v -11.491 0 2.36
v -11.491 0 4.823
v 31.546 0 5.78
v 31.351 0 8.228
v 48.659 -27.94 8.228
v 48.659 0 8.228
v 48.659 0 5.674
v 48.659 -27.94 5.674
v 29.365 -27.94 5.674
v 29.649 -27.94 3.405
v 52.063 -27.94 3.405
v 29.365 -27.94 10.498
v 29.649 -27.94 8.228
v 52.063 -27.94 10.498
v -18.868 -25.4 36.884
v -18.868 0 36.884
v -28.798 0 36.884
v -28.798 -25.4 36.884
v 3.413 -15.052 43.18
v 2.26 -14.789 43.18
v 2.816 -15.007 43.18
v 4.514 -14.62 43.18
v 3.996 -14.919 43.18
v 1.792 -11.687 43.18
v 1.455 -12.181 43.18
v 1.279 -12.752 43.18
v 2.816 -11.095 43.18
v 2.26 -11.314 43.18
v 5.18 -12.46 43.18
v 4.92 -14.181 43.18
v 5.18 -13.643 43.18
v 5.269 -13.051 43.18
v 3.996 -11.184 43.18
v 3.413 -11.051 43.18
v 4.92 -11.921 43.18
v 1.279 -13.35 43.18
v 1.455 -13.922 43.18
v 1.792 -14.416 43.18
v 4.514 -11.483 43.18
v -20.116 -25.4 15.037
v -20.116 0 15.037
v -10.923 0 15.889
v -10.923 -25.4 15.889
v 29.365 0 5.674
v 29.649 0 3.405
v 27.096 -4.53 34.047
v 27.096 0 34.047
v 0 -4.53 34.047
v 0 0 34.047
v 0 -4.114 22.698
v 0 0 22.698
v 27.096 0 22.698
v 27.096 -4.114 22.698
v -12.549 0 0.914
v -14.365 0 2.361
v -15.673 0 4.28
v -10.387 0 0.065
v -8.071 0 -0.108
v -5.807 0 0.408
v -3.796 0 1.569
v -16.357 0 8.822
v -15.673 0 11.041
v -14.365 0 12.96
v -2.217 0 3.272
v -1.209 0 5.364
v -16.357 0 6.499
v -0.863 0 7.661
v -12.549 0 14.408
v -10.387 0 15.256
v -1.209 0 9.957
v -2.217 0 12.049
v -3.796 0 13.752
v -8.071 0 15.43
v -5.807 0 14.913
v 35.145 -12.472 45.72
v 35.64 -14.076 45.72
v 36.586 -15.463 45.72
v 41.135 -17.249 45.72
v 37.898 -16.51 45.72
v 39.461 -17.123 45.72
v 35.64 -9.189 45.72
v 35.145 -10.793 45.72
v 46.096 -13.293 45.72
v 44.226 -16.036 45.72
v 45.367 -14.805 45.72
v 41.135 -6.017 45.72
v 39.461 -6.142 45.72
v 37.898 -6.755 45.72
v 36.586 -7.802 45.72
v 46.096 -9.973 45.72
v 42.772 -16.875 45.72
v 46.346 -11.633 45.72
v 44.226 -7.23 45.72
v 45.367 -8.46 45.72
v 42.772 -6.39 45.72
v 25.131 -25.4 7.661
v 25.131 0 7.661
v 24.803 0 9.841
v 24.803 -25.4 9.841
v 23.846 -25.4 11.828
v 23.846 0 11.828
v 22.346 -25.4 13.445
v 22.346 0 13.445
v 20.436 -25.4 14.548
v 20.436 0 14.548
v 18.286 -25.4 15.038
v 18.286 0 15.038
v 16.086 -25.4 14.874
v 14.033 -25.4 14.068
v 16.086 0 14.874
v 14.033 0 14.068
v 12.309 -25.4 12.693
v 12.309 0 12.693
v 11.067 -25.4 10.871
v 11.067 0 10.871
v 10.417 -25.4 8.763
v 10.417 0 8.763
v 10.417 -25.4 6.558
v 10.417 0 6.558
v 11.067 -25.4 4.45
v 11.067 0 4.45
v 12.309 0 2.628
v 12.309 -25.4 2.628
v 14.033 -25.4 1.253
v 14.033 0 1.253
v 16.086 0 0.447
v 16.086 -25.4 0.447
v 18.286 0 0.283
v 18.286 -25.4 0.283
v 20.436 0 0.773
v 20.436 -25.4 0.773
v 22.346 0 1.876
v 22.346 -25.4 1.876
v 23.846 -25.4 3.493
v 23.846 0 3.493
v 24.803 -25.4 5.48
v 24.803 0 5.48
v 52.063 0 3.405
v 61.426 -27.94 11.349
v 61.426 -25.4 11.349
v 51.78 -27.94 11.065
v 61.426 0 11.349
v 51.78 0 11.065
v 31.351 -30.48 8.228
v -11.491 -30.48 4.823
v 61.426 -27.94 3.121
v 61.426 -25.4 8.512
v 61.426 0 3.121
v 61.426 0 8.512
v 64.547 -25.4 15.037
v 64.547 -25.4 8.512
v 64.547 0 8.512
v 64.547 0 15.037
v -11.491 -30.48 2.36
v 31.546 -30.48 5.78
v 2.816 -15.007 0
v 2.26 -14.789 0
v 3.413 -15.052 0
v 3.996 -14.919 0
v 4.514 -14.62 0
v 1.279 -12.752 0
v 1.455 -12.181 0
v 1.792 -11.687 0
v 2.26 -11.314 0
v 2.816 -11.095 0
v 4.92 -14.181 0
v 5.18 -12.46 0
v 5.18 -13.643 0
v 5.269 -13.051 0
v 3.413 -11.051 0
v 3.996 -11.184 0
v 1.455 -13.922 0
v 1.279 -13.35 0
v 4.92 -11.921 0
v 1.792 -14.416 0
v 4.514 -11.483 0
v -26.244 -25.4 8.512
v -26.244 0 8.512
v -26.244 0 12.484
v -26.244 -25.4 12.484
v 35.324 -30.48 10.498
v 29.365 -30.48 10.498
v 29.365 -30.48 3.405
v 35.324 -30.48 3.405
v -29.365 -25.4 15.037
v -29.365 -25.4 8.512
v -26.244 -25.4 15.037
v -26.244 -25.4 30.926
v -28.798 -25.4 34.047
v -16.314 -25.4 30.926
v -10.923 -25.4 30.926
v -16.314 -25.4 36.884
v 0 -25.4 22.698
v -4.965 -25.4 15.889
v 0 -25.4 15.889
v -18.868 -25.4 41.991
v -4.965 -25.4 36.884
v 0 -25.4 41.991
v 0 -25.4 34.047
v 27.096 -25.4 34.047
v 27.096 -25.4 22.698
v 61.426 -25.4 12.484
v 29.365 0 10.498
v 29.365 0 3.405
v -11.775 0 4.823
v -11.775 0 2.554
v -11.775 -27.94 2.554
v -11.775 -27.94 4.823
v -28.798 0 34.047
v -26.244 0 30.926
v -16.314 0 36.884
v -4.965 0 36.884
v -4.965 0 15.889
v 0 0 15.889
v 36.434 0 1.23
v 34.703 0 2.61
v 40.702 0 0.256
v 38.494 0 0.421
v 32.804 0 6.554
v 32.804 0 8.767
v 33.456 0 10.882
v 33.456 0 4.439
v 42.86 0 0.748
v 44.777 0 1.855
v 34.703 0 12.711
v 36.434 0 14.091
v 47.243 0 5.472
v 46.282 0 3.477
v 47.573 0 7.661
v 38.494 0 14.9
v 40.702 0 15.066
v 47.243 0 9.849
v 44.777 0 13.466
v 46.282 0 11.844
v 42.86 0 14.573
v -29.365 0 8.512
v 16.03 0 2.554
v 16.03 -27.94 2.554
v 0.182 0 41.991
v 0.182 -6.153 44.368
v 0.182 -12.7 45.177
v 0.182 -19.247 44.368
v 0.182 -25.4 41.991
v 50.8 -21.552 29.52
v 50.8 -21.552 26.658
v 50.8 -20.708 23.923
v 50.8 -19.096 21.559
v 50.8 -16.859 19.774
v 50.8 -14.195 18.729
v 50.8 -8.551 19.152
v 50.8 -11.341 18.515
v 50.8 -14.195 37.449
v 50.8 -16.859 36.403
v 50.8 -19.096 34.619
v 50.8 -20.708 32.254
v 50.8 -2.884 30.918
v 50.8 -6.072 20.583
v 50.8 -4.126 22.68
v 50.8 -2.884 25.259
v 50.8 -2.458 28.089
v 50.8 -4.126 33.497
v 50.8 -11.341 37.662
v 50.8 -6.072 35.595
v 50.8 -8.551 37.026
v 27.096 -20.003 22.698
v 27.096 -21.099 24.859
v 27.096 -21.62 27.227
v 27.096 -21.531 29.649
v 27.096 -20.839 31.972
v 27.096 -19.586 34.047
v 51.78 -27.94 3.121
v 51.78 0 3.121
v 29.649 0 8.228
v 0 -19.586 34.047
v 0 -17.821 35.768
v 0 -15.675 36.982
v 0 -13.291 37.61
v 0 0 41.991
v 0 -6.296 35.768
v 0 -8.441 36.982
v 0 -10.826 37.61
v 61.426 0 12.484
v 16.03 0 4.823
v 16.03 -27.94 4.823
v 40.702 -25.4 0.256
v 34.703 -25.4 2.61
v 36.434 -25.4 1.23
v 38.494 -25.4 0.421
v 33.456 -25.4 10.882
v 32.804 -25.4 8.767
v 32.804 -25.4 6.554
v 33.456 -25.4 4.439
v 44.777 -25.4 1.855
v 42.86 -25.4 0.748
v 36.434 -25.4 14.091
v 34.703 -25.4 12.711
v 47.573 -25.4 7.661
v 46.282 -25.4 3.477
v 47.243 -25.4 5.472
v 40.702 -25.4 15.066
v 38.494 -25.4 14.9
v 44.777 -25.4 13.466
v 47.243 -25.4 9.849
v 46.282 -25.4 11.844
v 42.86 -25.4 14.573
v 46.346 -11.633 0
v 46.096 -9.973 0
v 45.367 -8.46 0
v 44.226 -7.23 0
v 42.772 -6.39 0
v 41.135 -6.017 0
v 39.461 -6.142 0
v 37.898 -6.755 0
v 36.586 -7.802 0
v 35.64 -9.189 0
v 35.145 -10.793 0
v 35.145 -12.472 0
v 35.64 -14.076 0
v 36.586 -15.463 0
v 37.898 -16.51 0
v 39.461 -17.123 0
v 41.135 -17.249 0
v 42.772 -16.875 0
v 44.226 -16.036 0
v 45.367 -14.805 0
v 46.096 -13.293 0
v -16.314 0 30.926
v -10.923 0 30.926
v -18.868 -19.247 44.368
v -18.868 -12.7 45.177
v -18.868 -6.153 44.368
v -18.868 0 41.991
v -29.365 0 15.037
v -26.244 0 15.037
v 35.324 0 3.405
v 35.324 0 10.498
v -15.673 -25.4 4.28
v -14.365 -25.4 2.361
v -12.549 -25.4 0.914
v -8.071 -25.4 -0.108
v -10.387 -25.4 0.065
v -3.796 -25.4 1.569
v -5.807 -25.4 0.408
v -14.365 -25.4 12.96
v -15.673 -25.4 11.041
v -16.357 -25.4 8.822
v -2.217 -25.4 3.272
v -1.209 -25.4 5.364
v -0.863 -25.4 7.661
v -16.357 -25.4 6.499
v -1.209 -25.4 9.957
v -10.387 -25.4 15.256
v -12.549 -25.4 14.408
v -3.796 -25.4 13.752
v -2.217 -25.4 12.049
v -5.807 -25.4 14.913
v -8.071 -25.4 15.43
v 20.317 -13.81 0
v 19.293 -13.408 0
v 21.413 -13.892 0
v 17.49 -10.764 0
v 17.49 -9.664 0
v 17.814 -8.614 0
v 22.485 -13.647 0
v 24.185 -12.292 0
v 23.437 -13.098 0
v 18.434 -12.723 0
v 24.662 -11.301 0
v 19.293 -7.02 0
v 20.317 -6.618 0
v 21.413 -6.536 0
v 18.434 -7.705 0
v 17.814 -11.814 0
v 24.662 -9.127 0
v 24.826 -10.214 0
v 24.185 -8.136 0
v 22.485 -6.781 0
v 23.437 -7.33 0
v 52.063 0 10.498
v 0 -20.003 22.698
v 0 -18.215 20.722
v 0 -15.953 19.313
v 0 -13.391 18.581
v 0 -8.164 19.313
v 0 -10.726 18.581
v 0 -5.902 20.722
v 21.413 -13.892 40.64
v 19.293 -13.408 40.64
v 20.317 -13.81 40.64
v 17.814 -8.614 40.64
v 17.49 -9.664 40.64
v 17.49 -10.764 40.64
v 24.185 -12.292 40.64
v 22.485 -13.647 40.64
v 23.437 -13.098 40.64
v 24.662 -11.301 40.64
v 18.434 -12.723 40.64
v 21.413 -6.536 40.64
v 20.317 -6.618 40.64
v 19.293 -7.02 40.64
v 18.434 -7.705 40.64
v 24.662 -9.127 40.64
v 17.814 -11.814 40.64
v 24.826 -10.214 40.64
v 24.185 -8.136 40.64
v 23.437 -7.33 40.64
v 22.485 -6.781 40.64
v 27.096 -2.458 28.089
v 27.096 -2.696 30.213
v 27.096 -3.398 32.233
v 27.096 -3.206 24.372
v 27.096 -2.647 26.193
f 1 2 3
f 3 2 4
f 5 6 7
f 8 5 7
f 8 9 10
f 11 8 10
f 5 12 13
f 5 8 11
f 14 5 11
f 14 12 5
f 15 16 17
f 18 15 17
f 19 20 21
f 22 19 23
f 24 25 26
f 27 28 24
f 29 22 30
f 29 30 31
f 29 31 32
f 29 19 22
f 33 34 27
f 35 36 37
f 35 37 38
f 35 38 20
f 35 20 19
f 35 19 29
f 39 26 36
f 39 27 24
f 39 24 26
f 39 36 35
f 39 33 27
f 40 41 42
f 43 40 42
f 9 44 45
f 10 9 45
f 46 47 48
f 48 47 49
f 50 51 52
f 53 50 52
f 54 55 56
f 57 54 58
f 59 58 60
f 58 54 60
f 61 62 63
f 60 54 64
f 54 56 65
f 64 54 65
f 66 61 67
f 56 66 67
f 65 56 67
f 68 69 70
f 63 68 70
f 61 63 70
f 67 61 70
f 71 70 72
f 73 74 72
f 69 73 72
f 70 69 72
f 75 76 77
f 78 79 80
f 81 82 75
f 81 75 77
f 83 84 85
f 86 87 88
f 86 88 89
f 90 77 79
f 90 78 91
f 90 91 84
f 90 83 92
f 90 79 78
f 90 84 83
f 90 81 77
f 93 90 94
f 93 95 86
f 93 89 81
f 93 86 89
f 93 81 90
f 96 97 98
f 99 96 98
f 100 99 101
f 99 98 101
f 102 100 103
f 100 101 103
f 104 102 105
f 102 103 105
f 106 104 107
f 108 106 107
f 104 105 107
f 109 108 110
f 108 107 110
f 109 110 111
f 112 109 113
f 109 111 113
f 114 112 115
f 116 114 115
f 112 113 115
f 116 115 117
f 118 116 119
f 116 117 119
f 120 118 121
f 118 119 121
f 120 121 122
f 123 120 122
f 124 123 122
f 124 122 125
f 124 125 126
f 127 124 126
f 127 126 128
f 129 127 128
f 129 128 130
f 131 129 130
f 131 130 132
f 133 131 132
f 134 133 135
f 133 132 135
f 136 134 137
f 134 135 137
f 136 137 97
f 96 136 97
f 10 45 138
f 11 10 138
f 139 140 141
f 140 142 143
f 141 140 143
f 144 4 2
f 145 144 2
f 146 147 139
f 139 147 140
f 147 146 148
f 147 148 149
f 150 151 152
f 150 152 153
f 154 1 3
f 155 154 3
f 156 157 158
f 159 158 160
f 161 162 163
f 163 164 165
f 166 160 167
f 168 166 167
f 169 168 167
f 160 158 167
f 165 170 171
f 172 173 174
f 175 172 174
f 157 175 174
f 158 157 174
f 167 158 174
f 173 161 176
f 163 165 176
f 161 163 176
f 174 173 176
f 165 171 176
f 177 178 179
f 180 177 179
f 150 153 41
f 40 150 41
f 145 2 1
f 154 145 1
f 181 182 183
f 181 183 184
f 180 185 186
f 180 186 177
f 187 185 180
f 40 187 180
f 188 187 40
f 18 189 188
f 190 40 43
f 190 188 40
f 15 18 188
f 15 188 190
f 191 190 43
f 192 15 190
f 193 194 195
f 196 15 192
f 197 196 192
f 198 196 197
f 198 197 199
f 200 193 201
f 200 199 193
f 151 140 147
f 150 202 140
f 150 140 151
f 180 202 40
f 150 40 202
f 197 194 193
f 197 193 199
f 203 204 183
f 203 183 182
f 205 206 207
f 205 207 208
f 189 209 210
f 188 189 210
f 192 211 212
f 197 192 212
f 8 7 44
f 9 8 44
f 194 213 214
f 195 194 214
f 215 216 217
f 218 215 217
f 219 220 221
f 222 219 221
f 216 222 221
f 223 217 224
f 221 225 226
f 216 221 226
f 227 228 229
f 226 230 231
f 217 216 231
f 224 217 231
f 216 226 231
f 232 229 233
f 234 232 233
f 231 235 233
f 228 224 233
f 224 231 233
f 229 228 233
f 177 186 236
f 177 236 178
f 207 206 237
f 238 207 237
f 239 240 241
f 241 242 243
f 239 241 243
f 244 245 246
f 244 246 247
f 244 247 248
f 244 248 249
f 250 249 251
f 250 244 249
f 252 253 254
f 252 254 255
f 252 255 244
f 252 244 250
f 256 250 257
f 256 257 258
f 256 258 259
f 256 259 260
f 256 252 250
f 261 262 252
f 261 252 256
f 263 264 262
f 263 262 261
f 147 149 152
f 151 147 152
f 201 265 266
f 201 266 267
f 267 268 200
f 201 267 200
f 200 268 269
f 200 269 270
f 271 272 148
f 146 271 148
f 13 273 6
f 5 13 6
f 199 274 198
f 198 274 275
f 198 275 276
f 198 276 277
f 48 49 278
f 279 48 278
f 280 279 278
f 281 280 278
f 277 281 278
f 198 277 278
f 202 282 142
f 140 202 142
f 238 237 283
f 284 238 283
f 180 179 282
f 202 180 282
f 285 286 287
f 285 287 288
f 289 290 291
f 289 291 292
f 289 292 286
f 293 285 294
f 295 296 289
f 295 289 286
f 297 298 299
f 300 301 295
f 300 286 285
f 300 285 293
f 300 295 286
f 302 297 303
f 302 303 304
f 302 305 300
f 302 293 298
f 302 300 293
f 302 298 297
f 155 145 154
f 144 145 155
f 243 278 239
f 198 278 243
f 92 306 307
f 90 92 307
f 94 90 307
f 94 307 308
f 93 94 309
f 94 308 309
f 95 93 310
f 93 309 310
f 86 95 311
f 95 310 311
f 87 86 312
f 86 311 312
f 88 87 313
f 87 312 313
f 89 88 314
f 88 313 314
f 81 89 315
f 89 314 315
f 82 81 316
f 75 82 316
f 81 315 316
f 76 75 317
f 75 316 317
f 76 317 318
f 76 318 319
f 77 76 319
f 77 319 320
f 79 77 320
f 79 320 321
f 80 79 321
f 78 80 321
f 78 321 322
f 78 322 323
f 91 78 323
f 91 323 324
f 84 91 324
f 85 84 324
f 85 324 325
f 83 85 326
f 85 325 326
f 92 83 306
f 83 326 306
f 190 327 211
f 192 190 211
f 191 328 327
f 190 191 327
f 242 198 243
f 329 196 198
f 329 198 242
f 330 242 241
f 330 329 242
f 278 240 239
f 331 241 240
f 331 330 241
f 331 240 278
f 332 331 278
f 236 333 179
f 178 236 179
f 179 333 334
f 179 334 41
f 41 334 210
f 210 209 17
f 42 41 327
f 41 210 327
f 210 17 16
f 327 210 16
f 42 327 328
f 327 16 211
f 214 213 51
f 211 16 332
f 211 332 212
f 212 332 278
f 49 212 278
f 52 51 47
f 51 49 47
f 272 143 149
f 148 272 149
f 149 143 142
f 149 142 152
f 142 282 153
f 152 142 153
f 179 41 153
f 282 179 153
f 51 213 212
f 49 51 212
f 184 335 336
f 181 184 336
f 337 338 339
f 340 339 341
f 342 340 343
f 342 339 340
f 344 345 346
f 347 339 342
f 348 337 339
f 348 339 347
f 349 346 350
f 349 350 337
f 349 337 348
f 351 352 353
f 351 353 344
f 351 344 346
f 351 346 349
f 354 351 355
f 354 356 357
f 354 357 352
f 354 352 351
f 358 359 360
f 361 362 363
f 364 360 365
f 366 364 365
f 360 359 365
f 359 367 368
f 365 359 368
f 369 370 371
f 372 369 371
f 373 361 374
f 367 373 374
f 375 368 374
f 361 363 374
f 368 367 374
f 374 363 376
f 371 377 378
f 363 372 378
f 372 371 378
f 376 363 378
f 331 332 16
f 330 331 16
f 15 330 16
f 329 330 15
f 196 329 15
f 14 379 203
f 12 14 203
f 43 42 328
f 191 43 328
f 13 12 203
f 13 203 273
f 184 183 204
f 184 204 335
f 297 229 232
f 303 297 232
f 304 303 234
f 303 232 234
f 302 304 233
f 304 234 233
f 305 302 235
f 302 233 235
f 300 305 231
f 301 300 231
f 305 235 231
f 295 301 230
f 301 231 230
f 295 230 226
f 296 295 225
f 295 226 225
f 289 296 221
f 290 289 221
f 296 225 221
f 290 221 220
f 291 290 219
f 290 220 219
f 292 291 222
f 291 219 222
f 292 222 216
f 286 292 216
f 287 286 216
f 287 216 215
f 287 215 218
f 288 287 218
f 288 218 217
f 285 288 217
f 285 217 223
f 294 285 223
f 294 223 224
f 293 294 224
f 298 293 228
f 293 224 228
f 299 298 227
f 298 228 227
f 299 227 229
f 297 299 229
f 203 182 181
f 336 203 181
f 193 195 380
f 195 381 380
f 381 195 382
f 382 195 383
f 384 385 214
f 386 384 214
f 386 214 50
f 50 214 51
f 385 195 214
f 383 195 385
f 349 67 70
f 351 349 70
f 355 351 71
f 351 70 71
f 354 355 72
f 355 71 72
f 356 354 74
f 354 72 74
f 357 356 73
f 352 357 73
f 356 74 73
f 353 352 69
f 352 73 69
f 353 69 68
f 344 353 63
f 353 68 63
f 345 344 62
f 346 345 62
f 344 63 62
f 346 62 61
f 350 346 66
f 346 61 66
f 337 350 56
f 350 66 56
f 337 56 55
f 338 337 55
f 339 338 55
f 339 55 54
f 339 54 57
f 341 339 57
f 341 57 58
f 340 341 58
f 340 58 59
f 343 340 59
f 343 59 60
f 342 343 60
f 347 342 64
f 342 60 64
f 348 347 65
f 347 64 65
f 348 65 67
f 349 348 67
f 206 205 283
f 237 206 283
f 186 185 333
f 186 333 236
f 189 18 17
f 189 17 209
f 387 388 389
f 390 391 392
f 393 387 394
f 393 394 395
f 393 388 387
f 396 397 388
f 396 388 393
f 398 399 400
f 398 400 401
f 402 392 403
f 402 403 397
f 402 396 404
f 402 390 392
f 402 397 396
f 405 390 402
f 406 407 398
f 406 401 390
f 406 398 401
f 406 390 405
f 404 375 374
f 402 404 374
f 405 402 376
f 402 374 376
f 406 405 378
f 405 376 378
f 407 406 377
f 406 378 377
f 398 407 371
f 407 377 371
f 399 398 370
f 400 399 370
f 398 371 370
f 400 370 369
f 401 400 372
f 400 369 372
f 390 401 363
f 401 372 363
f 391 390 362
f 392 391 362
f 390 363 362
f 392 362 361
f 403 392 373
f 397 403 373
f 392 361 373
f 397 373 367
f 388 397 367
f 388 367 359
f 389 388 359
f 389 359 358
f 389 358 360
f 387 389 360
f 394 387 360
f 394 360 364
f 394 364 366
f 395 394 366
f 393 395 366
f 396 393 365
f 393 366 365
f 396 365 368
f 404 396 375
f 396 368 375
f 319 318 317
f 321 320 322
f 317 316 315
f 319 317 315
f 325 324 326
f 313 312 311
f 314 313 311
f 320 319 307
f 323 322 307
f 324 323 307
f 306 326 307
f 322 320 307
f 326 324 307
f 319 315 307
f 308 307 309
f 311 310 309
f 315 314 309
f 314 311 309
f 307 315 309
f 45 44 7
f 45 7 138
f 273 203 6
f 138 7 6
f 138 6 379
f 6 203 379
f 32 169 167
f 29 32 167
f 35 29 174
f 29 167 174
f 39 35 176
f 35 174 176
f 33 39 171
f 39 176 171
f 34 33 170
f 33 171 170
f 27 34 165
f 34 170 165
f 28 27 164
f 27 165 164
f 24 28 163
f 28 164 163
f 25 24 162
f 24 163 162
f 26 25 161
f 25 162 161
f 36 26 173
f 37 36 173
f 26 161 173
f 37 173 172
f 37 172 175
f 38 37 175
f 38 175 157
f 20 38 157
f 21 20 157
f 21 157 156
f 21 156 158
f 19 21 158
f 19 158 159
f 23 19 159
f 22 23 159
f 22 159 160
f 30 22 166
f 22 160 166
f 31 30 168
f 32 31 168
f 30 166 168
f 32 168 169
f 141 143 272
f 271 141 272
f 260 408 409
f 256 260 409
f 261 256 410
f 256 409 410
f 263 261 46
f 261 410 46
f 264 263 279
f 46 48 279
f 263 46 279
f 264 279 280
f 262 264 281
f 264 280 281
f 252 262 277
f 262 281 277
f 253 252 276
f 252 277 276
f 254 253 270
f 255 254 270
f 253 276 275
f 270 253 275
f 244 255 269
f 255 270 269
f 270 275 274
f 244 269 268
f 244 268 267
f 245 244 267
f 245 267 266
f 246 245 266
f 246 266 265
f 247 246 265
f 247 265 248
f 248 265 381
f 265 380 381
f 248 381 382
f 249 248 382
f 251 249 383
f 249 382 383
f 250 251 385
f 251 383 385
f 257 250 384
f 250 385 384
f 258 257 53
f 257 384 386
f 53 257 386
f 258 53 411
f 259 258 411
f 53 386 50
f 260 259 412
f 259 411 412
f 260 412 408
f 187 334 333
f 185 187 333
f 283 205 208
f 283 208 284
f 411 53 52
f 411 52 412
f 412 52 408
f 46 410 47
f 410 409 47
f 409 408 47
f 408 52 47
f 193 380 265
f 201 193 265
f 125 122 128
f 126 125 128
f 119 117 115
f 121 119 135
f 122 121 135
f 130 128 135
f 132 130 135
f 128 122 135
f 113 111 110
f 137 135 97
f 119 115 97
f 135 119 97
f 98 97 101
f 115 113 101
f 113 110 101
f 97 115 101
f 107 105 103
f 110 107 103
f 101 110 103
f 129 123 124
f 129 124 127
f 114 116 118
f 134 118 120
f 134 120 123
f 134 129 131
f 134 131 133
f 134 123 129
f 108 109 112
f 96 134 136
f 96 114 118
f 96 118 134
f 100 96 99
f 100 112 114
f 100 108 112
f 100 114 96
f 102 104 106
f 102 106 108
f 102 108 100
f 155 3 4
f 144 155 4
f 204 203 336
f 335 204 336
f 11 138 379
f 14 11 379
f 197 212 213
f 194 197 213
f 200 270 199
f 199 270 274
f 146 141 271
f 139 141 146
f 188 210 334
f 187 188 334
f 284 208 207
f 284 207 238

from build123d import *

# Parameters (mm, degrees)
F0_R      = 7.790779
F0_R_2    = 7.398601
F0_R_3    = 7.425753
F1_DEPTH  = 25.4
F3_DEPTH  = 25.4
F5_DEPTH  = 25.4
F6_R      = 9.600592
F7_DEPTH  = 50.8
F9_DEPTH  = 27.94
F11_DEPTH = 27.94
F12_W     = 27.804894
F12_H     = 2.269787
F13_DEPTH = 27.94
F14_W     = 5.95819
F14_H     = 7.093086
F15_DEPTH = 30.48
F17_DEPTH = 30.48
F18_R     = 5.631747
F19_DEPTH = 45.72
F20_R     = 3.688405
F21_DEPTH = 40.64
F22_R     = 2.006228
F23_DEPTH = 43.18
F25_DEPTH = 19.05


with BuildPart() as f1:
    # F0 (on Front) → F1 (new body)
    with BuildSketch(Plane.XZ):
        with Locations((-8.653563, 7.660532)):
            Circle(F0_R)
        with Locations((17.732713, 7.660532)):
            Circle(F0_R_2)
        with Locations((40.146861, 7.660532)):
            Circle(F0_R_3)
    extrude(amount=F1_DEPTH)


with BuildPart() as f3:
    # F2 (on Front) → F3 (new body)
    with BuildSketch(Plane.XZ):
        Polygon((64.547077, 15.037341), (-12.058245, 15.037341), (-29.365372, 15.037341), (-29.365372, 8.511703), (-26.244415, 8.511703), (-26.244415, 12.483831), (61.426118, 12.483831), (61.426118, 8.511703), (64.547077, 8.511703), align=None)
    extrude(amount=F3_DEPTH)

    # F4 (on Front) → F5 (join)
    with BuildSketch(Plane.XZ):
        Polygon((-26.244415, 30.925851), (-26.244415, 14.469894), (-10.923351, 15.88851), (-10.923351, 30.925851), (-16.314095, 30.925851), (-16.314095, 36.884043), (-4.965159, 36.884043), (-4.965159, 15.88851), (0, 15.88851), (0, 22.697873), (27.095586, 22.697873), (27.095586, 34.04681), (0, 34.04681), (0, 41.991066), (-18.867606, 41.991066), (-18.867606, 36.884043), (-28.797926, 36.884043), (-28.797926, 34.04681), align=None)
    extrude(amount=F5_DEPTH)

    # F6 (on Right) → F7 (join)
    with BuildSketch(Plane.YZ):
        with Locations((-12.058245, 28.088616)):
            Circle(F6_R)
    extrude(amount=F7_DEPTH)

    # F8 (on Front) → F9 (join)
    with BuildSketch(Plane.XZ):
        Polygon((61.426118, 3.120958), (61.426118, 11.348937), (51.77952, 11.065213), (51.77952, 3.120958), align=None)
    extrude(amount=F9_DEPTH)

    # F24 (on face) → F25 (join)
    with BuildSketch(Plane(origin=(-18.867606, 0, 0), x_dir=(0, -1, 0), z_dir=(-1, 0, 0))):
        with BuildLine():
            Line((0, 41.991066), (25.4, 41.991066))
            ThreePointArc((25.4, 41.991066), (12.7, 45.177073), (0, 41.991066))
        make_face()
    extrude(amount=-F25_DEPTH)


with BuildPart() as f11:
    # F10 (on Front) → F11 (new body)
    with BuildSketch(Plane.XZ):
        Polygon((52.063245, 3.404681), (52.063245, 10.497767), (29.365374, 10.497767), (29.649096, 8.227979), (48.658565, 8.227979), (48.658565, 5.674468), (29.365374, 5.674468), (29.649096, 3.404681), align=None)
    extrude(amount=F11_DEPTH)


with BuildPart() as f13:
    # F12 (on Front) → F13 (new body)
    with BuildSketch(Plane.XZ):
        with Locations((2.127926, 3.688404)):
            Rectangle(F12_W, F12_H)
    extrude(amount=F13_DEPTH)


with BuildPart() as f15:
    # F14 (on Front) → F15 (new body)
    with BuildSketch(Plane.XZ):
        with Locations((32.344469, 6.951224)):
            Rectangle(F14_W, F14_H)
    extrude(amount=F15_DEPTH)


with BuildPart() as f17:
    # F16 (on Front) → F17 (new body)
    with BuildSketch(Plane.XZ):
        Polygon((31.351436, 8.227979), (-11.490799, 4.823298), (-11.490799, 2.359978), (31.545968, 5.780118), align=None)
    extrude(amount=F17_DEPTH)


with BuildPart() as f19:
    # F18 (on Top) → F19 (new body)
    with BuildSketch(Plane.XY):
        with Locations((40.714309, -11.632659)):
            Circle(F18_R)
    extrude(amount=F19_DEPTH)


with BuildPart() as f21:
    # F20 (on Top) → F21 (new body)
    with BuildSketch(Plane.XY):
        with Locations((21.137392, -10.214043)):
            Circle(F20_R)
    extrude(amount=F21_DEPTH)


with BuildPart() as f23:
    # F22 (on Top) → F23 (new body)
    with BuildSketch(Plane.XY):
        with Locations((3.262817, -13.051277)):
            Circle(F22_R)
    extrude(amount=F23_DEPTH)


solid = Compound([f1.part, f3.part, f11.part, f13.part, f15.part, f17.part, f19.part, f21.part, f23.part])
